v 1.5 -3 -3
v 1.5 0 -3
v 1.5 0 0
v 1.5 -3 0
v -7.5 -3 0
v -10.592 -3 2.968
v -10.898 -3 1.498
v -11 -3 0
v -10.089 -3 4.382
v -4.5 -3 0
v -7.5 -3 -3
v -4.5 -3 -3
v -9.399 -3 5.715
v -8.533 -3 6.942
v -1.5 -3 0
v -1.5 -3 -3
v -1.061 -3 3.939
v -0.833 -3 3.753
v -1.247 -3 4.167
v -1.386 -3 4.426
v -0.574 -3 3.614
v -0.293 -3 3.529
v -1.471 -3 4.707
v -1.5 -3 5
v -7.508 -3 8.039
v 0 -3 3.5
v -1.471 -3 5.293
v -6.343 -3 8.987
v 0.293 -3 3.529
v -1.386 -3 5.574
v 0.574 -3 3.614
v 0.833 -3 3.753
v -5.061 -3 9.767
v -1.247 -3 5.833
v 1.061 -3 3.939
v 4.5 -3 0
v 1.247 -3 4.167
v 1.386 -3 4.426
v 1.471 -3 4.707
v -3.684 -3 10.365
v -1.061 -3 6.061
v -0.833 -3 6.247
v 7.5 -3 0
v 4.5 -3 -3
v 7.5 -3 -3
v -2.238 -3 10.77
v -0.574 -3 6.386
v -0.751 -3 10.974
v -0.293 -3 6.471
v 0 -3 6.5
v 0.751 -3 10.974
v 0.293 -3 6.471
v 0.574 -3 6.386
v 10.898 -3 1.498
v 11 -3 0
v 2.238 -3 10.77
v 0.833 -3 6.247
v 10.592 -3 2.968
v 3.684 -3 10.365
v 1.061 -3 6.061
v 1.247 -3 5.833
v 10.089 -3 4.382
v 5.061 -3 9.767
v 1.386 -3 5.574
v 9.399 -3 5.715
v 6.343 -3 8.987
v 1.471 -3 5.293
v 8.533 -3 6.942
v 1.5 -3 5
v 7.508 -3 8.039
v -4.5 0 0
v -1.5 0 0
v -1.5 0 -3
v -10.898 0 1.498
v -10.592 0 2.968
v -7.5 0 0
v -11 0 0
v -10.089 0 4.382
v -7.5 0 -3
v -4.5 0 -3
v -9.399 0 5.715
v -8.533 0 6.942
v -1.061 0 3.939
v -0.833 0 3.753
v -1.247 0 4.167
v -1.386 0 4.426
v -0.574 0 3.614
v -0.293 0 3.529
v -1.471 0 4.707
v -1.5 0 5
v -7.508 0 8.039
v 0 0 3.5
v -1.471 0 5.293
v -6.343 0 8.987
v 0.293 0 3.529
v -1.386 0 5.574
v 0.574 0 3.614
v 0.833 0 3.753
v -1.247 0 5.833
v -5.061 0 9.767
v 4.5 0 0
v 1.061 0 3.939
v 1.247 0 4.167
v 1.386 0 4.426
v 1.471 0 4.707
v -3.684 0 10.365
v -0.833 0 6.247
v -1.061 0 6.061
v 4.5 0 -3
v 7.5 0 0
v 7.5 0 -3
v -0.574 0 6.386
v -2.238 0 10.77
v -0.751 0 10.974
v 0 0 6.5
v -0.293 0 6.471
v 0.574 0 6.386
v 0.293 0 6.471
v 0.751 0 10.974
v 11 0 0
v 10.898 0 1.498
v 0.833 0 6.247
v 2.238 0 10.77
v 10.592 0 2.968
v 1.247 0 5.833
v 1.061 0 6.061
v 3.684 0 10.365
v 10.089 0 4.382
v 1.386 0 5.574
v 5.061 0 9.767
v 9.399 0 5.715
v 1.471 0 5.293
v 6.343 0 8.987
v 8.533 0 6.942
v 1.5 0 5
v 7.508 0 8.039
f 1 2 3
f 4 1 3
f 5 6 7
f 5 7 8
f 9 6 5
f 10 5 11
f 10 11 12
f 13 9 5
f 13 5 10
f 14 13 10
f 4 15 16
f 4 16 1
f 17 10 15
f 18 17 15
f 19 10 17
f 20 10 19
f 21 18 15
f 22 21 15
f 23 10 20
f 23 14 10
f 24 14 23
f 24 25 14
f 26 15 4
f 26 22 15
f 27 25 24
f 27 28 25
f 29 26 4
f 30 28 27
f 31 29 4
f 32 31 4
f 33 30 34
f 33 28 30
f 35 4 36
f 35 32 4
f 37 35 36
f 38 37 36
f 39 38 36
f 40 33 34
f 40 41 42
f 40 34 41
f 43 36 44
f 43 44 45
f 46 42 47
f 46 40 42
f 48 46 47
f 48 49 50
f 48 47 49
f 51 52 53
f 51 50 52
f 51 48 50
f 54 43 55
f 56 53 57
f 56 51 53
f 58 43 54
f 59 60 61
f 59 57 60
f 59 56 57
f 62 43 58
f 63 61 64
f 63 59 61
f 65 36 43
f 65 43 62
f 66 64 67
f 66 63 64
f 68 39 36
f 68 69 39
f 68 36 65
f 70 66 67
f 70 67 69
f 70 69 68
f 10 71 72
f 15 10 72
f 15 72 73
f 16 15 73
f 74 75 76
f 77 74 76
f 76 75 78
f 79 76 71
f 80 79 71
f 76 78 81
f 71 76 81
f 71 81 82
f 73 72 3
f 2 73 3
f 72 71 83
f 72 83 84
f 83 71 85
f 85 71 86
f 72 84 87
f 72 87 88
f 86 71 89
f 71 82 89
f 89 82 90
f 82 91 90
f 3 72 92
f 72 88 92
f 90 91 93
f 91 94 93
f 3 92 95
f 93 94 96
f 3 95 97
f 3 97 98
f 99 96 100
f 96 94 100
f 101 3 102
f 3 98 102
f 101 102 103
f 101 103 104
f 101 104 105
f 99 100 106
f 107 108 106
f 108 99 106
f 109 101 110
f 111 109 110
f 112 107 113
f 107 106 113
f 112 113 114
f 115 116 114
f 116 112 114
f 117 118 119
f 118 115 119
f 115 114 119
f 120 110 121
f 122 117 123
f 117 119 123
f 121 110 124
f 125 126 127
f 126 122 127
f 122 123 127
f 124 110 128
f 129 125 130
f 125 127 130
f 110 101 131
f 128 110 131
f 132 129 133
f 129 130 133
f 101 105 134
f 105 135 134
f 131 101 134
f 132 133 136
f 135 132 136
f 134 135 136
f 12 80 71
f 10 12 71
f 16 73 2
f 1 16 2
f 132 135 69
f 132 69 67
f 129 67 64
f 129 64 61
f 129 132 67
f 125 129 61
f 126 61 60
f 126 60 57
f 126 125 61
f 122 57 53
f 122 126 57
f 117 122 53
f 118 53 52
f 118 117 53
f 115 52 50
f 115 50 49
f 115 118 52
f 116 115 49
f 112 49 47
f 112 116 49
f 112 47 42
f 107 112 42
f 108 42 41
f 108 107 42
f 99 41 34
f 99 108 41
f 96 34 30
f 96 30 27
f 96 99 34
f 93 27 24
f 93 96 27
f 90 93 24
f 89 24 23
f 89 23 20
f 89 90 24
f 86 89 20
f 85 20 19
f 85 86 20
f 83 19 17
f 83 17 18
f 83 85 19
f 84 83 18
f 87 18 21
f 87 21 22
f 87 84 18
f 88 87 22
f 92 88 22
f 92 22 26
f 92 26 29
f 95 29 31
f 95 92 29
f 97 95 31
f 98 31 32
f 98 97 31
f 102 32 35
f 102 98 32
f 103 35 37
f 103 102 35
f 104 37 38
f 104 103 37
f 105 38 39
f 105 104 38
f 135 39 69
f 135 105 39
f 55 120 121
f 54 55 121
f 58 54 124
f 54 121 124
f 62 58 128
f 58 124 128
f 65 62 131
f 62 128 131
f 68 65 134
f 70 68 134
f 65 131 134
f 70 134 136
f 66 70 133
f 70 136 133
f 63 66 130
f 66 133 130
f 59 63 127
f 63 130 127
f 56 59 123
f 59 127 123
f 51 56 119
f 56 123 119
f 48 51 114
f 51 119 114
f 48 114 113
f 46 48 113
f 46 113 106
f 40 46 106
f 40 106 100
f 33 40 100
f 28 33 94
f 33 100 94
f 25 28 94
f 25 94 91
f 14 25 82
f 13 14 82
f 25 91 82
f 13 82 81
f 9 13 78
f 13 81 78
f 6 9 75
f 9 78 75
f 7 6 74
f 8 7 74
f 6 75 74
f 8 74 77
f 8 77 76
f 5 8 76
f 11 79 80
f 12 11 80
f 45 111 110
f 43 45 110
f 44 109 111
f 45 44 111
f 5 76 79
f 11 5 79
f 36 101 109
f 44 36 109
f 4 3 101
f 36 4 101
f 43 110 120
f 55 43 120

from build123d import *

# Parameters (mm, degrees)
F0_R     = 1.5
F1_DEPTH = 3


# Not quite as in the source:
# - a feature names something its author has since deleted; it is built from what else it names


with BuildPart() as f1:
    # F0 (on Front) → F1 (new body)
    with BuildSketch(Plane.XZ):
        with BuildLine():
            Line((7.5, 0), (11, 0))
            ThreePointArc((11, 0), (0, 11), (-11, 0))
            Line((-11, 0), (-7.5, 0))
            Line((-7.5, 0), (-7.5, -3))
            Line((-7.5, -3), (-4.5, -3))
            Line((-4.5, -3), (-4.5, 0))
            Line((-4.5, 0), (-1.5, 0))
            Line((-1.5, 0), (-1.5, -3))
            Line((-1.5, -3), (1.5, -3))
            Line((1.5, -3), (1.5, 0))
            Line((1.5, 0), (4.5, 0))
            Line((4.5, 0), (4.5, -3))
            Line((4.5, -3), (7.5, -3))
            Line((7.5, -3), (7.5, 0))
        make_face()
        with Locations((0, 5)):
            Circle(F0_R, mode=Mode.SUBTRACT)
    extrude(amount=F1_DEPTH)


solid = f1.part
